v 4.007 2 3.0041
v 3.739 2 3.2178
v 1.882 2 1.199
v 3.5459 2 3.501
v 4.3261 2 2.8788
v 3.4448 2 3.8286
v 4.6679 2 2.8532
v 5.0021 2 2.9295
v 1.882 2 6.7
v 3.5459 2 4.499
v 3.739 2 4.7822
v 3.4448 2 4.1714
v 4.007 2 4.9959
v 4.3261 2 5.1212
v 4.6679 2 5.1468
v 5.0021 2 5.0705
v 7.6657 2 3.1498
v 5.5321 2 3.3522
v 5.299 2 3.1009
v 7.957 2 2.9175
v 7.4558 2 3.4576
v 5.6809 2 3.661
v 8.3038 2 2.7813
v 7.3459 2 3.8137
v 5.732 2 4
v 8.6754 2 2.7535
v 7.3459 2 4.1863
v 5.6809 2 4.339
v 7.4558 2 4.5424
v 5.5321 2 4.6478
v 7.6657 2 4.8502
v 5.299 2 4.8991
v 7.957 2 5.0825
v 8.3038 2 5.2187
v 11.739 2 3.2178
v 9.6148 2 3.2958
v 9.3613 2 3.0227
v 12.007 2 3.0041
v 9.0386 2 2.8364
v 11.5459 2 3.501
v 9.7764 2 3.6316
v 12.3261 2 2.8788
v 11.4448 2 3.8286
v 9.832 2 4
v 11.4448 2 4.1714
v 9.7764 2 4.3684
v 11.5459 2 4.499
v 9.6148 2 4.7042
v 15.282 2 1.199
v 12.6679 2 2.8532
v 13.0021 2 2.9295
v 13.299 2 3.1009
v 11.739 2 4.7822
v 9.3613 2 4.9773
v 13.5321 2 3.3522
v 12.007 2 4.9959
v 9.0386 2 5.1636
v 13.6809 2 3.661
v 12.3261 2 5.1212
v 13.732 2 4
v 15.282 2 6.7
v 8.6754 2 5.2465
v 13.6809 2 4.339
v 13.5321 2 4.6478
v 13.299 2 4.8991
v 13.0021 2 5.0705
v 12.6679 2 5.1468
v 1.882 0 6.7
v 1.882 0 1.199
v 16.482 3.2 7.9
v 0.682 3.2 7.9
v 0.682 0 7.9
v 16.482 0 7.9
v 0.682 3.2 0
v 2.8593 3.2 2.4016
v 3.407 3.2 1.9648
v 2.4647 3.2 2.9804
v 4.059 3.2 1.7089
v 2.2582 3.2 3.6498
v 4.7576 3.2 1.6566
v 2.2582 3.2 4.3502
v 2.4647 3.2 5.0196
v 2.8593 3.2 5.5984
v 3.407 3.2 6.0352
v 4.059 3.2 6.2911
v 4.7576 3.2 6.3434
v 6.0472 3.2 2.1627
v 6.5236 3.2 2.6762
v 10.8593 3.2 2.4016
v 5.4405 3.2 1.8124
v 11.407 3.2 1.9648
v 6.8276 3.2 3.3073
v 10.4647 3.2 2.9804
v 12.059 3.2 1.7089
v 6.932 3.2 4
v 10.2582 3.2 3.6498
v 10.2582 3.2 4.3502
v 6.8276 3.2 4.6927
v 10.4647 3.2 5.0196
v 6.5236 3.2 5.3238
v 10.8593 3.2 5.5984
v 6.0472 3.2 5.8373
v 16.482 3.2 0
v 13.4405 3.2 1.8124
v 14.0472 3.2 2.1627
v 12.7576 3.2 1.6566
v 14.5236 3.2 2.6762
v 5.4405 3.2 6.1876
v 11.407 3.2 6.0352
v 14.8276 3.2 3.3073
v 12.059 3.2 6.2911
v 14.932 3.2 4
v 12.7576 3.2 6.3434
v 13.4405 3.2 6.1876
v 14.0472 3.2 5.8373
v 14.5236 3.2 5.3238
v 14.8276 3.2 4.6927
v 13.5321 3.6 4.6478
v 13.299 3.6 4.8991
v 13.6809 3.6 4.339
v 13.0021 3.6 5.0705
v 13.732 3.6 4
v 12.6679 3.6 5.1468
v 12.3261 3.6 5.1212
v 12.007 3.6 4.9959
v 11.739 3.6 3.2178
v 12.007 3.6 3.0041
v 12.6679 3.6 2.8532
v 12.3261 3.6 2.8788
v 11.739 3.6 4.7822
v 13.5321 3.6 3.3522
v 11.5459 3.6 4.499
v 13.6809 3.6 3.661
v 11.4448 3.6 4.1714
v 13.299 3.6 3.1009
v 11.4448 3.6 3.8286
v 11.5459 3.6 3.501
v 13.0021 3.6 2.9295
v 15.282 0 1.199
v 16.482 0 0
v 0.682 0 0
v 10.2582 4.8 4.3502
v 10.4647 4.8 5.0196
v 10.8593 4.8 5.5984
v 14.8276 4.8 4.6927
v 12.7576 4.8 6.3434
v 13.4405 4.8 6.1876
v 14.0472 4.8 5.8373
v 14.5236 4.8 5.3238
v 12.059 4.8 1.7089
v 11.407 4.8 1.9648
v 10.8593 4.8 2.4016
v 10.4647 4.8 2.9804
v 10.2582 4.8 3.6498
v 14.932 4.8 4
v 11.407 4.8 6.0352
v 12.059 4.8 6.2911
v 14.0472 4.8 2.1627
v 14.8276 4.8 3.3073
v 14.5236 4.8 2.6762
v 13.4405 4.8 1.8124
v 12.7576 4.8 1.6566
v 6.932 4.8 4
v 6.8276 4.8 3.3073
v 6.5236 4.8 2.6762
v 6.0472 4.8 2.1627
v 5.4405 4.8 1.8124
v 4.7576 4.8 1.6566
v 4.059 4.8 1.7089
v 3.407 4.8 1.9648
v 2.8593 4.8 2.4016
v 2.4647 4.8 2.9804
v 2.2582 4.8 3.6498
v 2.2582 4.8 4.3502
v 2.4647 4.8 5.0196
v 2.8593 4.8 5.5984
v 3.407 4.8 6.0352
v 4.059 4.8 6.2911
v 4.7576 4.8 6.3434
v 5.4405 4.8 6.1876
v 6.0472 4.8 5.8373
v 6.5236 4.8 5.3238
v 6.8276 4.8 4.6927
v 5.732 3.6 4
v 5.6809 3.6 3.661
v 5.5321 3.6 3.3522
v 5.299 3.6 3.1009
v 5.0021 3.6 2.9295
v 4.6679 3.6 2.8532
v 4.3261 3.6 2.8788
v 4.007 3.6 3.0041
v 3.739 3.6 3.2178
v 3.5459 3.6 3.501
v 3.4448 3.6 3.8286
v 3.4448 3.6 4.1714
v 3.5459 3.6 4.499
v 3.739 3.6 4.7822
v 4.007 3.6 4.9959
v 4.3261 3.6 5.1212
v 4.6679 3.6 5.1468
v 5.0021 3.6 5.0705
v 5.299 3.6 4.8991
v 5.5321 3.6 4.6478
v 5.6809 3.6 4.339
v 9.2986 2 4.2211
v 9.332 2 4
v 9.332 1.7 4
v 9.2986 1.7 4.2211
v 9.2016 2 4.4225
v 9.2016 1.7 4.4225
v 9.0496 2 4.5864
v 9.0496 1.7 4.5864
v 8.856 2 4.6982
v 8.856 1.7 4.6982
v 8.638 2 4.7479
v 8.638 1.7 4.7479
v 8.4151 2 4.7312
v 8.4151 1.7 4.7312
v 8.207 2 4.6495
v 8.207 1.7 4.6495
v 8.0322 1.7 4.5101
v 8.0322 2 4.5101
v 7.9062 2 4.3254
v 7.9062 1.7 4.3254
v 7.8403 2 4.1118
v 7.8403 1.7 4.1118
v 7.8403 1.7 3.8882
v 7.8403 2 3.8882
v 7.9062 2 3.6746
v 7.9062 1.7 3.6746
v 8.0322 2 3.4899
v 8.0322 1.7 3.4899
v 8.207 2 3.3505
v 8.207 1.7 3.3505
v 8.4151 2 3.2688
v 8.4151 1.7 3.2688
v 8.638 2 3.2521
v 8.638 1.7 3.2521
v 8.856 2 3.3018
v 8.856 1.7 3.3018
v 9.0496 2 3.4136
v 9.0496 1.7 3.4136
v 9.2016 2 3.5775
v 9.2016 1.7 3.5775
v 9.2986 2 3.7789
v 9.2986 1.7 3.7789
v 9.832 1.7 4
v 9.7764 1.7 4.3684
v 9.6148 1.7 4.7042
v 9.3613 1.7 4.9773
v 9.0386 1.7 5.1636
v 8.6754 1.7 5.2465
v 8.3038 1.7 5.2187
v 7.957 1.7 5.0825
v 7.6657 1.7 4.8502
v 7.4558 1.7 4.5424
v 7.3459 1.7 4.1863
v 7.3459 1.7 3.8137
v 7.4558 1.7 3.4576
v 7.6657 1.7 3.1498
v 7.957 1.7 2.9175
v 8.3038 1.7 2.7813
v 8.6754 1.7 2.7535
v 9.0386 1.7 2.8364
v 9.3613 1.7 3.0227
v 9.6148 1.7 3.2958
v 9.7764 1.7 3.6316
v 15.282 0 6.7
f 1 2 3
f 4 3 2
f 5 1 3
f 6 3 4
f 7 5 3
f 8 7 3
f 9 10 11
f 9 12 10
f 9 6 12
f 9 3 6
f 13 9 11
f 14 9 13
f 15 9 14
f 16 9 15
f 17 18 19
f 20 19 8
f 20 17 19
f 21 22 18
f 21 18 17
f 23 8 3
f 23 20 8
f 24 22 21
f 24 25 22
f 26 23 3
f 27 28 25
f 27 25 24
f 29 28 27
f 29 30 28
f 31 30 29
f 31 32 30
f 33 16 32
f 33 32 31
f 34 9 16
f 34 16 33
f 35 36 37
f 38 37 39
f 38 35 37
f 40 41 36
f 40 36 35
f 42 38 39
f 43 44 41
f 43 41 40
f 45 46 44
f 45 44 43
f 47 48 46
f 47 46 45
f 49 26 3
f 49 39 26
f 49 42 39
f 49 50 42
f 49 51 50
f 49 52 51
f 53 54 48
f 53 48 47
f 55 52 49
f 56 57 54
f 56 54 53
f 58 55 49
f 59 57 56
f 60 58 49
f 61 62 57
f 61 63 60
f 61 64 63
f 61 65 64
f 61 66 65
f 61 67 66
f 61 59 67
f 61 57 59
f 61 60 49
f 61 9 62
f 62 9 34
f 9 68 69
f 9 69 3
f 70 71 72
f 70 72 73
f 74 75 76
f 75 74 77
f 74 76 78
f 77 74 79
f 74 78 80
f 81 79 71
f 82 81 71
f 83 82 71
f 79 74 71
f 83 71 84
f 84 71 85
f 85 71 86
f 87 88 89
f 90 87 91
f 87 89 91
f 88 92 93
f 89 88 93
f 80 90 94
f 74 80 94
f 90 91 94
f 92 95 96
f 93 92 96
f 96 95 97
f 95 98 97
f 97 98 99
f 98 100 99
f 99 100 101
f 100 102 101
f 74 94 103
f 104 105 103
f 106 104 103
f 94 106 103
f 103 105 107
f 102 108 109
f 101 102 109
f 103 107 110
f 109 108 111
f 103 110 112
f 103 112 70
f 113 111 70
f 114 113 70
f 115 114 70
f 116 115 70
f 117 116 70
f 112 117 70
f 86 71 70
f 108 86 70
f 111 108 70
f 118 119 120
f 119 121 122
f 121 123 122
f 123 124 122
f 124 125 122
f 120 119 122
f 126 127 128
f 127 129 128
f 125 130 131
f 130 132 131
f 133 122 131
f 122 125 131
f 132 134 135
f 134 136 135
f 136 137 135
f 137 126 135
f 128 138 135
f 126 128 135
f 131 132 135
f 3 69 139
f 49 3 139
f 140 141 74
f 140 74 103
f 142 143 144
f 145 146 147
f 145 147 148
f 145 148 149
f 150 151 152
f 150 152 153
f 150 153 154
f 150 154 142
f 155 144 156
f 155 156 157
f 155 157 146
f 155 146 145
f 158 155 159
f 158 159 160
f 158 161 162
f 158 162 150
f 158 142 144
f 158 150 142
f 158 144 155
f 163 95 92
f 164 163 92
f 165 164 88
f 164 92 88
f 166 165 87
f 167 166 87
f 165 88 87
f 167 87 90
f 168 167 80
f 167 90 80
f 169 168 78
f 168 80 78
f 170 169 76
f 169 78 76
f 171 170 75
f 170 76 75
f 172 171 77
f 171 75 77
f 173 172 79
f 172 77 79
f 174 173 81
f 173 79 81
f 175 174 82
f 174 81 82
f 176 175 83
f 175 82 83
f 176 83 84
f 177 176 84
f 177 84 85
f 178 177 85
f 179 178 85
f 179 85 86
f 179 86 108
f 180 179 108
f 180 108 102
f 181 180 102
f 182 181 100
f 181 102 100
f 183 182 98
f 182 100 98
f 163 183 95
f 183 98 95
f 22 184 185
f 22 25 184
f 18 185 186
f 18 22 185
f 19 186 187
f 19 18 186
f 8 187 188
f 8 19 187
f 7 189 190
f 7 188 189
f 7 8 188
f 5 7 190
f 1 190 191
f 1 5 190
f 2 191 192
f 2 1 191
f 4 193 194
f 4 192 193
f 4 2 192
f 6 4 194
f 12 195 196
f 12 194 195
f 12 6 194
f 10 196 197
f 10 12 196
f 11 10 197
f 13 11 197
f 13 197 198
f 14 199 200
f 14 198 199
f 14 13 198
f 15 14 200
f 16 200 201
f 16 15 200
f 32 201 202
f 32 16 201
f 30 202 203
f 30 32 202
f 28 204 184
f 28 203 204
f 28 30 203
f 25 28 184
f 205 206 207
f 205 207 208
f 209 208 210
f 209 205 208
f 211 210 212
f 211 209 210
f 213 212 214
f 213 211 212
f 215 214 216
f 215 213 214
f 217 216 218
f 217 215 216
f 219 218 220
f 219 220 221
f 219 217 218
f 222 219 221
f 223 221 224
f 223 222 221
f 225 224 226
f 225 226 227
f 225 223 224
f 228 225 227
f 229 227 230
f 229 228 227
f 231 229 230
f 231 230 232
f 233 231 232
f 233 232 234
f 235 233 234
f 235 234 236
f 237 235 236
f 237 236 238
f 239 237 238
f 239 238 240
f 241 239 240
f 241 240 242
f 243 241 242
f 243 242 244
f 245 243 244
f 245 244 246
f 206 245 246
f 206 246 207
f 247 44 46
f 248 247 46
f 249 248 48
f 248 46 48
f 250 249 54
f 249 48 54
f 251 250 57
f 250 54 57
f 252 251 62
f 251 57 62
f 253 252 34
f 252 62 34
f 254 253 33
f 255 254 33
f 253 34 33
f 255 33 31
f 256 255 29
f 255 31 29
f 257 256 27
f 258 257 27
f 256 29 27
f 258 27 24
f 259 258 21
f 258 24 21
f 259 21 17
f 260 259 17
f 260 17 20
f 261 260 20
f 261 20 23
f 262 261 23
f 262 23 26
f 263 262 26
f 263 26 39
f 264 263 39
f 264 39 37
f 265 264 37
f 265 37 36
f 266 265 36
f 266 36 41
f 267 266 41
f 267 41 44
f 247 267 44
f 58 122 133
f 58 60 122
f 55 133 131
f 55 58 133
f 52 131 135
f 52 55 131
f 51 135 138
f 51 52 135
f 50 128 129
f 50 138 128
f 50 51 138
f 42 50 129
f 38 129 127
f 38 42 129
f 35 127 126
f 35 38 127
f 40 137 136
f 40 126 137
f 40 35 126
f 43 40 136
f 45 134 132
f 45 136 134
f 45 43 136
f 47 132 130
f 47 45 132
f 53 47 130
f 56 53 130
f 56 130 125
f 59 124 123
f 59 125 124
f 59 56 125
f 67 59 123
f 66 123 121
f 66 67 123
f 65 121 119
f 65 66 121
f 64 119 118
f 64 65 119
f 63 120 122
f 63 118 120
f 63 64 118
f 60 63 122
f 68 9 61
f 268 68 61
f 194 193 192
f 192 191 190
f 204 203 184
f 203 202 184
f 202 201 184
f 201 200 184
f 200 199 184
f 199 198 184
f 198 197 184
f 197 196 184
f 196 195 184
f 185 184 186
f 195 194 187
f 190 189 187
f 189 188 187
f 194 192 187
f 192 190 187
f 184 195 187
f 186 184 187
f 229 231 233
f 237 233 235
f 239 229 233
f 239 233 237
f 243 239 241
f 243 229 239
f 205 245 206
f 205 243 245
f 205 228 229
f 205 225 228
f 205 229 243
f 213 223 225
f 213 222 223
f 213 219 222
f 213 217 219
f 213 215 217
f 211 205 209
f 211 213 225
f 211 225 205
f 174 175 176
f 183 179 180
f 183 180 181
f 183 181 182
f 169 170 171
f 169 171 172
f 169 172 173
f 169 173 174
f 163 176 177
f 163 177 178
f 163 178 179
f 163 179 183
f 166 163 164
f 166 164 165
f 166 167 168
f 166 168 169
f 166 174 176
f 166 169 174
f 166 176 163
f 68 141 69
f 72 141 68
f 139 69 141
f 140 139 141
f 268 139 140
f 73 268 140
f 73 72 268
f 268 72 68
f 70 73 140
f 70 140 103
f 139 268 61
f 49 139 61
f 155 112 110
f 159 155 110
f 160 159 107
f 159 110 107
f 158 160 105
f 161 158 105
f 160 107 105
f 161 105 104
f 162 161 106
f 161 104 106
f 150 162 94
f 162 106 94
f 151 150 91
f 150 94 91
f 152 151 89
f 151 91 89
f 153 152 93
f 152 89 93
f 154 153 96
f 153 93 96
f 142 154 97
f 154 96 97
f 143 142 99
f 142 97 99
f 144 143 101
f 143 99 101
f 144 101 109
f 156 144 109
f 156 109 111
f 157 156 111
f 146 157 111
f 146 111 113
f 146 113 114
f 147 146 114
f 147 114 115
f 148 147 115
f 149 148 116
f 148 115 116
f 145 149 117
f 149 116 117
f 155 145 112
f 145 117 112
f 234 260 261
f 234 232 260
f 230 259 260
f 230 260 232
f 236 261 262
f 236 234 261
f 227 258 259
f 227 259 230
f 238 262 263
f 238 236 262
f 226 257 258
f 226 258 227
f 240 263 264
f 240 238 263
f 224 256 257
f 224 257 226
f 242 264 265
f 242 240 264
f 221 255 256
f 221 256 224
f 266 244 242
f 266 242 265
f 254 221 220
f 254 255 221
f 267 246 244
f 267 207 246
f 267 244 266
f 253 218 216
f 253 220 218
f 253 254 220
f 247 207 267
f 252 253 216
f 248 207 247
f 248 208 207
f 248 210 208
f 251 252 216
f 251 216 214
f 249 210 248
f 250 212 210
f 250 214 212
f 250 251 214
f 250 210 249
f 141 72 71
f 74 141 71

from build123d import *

# Parameters (mm, degrees)
MAINBASESKETCH_W        = 15.8
MAINBASESKETCH_H        = 3.2
MAINBASEEXTRUDE_DEPTH   = 7.9
STUDSSKETCH_R           = 2.35
STUDSEXTRUDE_DEPTH      = 1.6
STUDSPATTERN_COUNT      = 2
STUDSPATTERN_PITCH      = 8
STUDSPATTERN_COUNT_DIR2 = 2
STUDSPATTERN_PITCH_DIR2 = 8
MAINBASESHELL_T         = -1.2
LCUTBLUE_DEPTH          = 19.555463972
LCUTBLUE_DEPTH_BACK     = 19.555463972
CUTADDEDTOLCUT_DEPTH    = 2
MADESLIMCUTSKETCH_W     = 7.9
MADESLIMCUTSKETCH_H     = 7.9
MADESLIMCUT_DEPTH       = 19.897228453
MADESLIMFILLEXT_REACH   = 20.897
SKETCH33_W              = 5.500952983
SKETCH33_H              = 1.199047018
SLIMHOLEEXT_START       = -0.2
SLIMHOLESKETCH_R        = 1.25
SLIMHOLESKETCH_R_2      = 0.75
SLIMHOLEEXT_DEPTH       = 0.5


with BuildPart() as part:
    # MainBaseSketch → MainBaseExtrude (new, symmetric)
    with BuildSketch(Plane.XY):
        with Locations((8.581967213, 1.6)):
            Rectangle(MAINBASESKETCH_W, MAINBASESKETCH_H)
    extrude(amount=MAINBASEEXTRUDE_DEPTH, both=True)

    # StudsSketch → StudsExtrude (add)
    with BuildSketch(Plane(origin=(0, 3.2, 0), x_dir=(1, 0, 0), z_dir=(0, 1, 0))):
        with Locations((4.581967213, 4)):
            Circle(STUDSSKETCH_R)
    studsextrude = extrude(amount=STUDSEXTRUDE_DEPTH)

    # StudsPattern: StudsExtrude 2 × 2
    with Locations(*[(j * STUDSPATTERN_PITCH_DIR2, 0, i * STUDSPATTERN_PITCH) for i in range(STUDSPATTERN_COUNT) for j in range(STUDSPATTERN_COUNT_DIR2) if (i, j) != (0, 0)]):
        add(studsextrude)

    # MainBaseShell
    mainbaseshell_openings = [part.faces().sort_by_distance(p)[0] for p in [
        (8.581967213, 0, 0),
    ]]
    offset(amount=MAINBASESHELL_T, openings=mainbaseshell_openings, kind=Kind.INTERSECTION)

    # LCUTBlueSketch → LCutBlue (cut, two sides: drawn at the far end of the back side and taken through both)
    with BuildSketch(Plane(origin=(0, 3.2, 0), x_dir=(1, 0, 0), z_dir=(0, 1, 0)).offset(-LCUTBLUE_DEPTH_BACK)):
        Polygon((8.581967213, 53.229874044), (8.581967213, 7.9), (8.581967213, 0), (16.481967213, 0), (61.811841258, 0), (125.917963912, 64.106122654), (72.688089868, 117.335996699), align=None)
    extrude(amount=LCUTBLUE_DEPTH + LCUTBLUE_DEPTH_BACK, mode=Mode.SUBTRACT)

    # CutAddedtoLSketch → CutAddedToLCut (add)
    with BuildSketch(Plane.XZ):
        Polygon((7.382920196, -6.7), (8.581967213, -6.7), (8.581967213, 0), (15.281967213, 0), (15.281967213, 1.199047018), (7.382920196, 1.199047018), (7.382920196, 0), align=None)
    extrude(amount=-CUTADDEDTOLCUT_DEPTH)

    # MadeSlimCutSketch → MadeSlimCut (cut, through all)
    with BuildSketch(Plane.XZ):
        with Locations((4.631967213, -3.95)):
            Rectangle(MADESLIMCUTSKETCH_W, MADESLIMCUTSKETCH_H)
    extrude(amount=-MADESLIMCUT_DEPTH, mode=Mode.SUBTRACT)

    # Sketch33 → MadeSlimFillExt (add, up to next)
    with BuildSketch(Plane.XZ, mode=Mode.PRIVATE) as madeslimfillext_sk1:
        with Locations((4.632443704, 0.599523509)):
            Rectangle(SKETCH33_W, SKETCH33_H)
    madeslimfillext_tool1 = extrude(madeslimfillext_sk1.sketch, amount=-MADESLIMFILLEXT_REACH, mode=Mode.PRIVATE) - part.part
    add(madeslimfillext_tool1.solids().sort_by_distance((4.632444, 0, 0.599524))[0])

    # SlimHoleSketch → SlimHoleExt (add)
    with BuildSketch(Plane.XZ.offset(-2).offset(SLIMHOLEEXT_START)):
        with Locations((8.581967213, 4)):
            Circle(SLIMHOLESKETCH_R)
        with Locations((8.581967213, 4)):
            Circle(SLIMHOLESKETCH_R_2, mode=Mode.SUBTRACT)
    extrude(amount=SLIMHOLEEXT_DEPTH)


solid = part.part
